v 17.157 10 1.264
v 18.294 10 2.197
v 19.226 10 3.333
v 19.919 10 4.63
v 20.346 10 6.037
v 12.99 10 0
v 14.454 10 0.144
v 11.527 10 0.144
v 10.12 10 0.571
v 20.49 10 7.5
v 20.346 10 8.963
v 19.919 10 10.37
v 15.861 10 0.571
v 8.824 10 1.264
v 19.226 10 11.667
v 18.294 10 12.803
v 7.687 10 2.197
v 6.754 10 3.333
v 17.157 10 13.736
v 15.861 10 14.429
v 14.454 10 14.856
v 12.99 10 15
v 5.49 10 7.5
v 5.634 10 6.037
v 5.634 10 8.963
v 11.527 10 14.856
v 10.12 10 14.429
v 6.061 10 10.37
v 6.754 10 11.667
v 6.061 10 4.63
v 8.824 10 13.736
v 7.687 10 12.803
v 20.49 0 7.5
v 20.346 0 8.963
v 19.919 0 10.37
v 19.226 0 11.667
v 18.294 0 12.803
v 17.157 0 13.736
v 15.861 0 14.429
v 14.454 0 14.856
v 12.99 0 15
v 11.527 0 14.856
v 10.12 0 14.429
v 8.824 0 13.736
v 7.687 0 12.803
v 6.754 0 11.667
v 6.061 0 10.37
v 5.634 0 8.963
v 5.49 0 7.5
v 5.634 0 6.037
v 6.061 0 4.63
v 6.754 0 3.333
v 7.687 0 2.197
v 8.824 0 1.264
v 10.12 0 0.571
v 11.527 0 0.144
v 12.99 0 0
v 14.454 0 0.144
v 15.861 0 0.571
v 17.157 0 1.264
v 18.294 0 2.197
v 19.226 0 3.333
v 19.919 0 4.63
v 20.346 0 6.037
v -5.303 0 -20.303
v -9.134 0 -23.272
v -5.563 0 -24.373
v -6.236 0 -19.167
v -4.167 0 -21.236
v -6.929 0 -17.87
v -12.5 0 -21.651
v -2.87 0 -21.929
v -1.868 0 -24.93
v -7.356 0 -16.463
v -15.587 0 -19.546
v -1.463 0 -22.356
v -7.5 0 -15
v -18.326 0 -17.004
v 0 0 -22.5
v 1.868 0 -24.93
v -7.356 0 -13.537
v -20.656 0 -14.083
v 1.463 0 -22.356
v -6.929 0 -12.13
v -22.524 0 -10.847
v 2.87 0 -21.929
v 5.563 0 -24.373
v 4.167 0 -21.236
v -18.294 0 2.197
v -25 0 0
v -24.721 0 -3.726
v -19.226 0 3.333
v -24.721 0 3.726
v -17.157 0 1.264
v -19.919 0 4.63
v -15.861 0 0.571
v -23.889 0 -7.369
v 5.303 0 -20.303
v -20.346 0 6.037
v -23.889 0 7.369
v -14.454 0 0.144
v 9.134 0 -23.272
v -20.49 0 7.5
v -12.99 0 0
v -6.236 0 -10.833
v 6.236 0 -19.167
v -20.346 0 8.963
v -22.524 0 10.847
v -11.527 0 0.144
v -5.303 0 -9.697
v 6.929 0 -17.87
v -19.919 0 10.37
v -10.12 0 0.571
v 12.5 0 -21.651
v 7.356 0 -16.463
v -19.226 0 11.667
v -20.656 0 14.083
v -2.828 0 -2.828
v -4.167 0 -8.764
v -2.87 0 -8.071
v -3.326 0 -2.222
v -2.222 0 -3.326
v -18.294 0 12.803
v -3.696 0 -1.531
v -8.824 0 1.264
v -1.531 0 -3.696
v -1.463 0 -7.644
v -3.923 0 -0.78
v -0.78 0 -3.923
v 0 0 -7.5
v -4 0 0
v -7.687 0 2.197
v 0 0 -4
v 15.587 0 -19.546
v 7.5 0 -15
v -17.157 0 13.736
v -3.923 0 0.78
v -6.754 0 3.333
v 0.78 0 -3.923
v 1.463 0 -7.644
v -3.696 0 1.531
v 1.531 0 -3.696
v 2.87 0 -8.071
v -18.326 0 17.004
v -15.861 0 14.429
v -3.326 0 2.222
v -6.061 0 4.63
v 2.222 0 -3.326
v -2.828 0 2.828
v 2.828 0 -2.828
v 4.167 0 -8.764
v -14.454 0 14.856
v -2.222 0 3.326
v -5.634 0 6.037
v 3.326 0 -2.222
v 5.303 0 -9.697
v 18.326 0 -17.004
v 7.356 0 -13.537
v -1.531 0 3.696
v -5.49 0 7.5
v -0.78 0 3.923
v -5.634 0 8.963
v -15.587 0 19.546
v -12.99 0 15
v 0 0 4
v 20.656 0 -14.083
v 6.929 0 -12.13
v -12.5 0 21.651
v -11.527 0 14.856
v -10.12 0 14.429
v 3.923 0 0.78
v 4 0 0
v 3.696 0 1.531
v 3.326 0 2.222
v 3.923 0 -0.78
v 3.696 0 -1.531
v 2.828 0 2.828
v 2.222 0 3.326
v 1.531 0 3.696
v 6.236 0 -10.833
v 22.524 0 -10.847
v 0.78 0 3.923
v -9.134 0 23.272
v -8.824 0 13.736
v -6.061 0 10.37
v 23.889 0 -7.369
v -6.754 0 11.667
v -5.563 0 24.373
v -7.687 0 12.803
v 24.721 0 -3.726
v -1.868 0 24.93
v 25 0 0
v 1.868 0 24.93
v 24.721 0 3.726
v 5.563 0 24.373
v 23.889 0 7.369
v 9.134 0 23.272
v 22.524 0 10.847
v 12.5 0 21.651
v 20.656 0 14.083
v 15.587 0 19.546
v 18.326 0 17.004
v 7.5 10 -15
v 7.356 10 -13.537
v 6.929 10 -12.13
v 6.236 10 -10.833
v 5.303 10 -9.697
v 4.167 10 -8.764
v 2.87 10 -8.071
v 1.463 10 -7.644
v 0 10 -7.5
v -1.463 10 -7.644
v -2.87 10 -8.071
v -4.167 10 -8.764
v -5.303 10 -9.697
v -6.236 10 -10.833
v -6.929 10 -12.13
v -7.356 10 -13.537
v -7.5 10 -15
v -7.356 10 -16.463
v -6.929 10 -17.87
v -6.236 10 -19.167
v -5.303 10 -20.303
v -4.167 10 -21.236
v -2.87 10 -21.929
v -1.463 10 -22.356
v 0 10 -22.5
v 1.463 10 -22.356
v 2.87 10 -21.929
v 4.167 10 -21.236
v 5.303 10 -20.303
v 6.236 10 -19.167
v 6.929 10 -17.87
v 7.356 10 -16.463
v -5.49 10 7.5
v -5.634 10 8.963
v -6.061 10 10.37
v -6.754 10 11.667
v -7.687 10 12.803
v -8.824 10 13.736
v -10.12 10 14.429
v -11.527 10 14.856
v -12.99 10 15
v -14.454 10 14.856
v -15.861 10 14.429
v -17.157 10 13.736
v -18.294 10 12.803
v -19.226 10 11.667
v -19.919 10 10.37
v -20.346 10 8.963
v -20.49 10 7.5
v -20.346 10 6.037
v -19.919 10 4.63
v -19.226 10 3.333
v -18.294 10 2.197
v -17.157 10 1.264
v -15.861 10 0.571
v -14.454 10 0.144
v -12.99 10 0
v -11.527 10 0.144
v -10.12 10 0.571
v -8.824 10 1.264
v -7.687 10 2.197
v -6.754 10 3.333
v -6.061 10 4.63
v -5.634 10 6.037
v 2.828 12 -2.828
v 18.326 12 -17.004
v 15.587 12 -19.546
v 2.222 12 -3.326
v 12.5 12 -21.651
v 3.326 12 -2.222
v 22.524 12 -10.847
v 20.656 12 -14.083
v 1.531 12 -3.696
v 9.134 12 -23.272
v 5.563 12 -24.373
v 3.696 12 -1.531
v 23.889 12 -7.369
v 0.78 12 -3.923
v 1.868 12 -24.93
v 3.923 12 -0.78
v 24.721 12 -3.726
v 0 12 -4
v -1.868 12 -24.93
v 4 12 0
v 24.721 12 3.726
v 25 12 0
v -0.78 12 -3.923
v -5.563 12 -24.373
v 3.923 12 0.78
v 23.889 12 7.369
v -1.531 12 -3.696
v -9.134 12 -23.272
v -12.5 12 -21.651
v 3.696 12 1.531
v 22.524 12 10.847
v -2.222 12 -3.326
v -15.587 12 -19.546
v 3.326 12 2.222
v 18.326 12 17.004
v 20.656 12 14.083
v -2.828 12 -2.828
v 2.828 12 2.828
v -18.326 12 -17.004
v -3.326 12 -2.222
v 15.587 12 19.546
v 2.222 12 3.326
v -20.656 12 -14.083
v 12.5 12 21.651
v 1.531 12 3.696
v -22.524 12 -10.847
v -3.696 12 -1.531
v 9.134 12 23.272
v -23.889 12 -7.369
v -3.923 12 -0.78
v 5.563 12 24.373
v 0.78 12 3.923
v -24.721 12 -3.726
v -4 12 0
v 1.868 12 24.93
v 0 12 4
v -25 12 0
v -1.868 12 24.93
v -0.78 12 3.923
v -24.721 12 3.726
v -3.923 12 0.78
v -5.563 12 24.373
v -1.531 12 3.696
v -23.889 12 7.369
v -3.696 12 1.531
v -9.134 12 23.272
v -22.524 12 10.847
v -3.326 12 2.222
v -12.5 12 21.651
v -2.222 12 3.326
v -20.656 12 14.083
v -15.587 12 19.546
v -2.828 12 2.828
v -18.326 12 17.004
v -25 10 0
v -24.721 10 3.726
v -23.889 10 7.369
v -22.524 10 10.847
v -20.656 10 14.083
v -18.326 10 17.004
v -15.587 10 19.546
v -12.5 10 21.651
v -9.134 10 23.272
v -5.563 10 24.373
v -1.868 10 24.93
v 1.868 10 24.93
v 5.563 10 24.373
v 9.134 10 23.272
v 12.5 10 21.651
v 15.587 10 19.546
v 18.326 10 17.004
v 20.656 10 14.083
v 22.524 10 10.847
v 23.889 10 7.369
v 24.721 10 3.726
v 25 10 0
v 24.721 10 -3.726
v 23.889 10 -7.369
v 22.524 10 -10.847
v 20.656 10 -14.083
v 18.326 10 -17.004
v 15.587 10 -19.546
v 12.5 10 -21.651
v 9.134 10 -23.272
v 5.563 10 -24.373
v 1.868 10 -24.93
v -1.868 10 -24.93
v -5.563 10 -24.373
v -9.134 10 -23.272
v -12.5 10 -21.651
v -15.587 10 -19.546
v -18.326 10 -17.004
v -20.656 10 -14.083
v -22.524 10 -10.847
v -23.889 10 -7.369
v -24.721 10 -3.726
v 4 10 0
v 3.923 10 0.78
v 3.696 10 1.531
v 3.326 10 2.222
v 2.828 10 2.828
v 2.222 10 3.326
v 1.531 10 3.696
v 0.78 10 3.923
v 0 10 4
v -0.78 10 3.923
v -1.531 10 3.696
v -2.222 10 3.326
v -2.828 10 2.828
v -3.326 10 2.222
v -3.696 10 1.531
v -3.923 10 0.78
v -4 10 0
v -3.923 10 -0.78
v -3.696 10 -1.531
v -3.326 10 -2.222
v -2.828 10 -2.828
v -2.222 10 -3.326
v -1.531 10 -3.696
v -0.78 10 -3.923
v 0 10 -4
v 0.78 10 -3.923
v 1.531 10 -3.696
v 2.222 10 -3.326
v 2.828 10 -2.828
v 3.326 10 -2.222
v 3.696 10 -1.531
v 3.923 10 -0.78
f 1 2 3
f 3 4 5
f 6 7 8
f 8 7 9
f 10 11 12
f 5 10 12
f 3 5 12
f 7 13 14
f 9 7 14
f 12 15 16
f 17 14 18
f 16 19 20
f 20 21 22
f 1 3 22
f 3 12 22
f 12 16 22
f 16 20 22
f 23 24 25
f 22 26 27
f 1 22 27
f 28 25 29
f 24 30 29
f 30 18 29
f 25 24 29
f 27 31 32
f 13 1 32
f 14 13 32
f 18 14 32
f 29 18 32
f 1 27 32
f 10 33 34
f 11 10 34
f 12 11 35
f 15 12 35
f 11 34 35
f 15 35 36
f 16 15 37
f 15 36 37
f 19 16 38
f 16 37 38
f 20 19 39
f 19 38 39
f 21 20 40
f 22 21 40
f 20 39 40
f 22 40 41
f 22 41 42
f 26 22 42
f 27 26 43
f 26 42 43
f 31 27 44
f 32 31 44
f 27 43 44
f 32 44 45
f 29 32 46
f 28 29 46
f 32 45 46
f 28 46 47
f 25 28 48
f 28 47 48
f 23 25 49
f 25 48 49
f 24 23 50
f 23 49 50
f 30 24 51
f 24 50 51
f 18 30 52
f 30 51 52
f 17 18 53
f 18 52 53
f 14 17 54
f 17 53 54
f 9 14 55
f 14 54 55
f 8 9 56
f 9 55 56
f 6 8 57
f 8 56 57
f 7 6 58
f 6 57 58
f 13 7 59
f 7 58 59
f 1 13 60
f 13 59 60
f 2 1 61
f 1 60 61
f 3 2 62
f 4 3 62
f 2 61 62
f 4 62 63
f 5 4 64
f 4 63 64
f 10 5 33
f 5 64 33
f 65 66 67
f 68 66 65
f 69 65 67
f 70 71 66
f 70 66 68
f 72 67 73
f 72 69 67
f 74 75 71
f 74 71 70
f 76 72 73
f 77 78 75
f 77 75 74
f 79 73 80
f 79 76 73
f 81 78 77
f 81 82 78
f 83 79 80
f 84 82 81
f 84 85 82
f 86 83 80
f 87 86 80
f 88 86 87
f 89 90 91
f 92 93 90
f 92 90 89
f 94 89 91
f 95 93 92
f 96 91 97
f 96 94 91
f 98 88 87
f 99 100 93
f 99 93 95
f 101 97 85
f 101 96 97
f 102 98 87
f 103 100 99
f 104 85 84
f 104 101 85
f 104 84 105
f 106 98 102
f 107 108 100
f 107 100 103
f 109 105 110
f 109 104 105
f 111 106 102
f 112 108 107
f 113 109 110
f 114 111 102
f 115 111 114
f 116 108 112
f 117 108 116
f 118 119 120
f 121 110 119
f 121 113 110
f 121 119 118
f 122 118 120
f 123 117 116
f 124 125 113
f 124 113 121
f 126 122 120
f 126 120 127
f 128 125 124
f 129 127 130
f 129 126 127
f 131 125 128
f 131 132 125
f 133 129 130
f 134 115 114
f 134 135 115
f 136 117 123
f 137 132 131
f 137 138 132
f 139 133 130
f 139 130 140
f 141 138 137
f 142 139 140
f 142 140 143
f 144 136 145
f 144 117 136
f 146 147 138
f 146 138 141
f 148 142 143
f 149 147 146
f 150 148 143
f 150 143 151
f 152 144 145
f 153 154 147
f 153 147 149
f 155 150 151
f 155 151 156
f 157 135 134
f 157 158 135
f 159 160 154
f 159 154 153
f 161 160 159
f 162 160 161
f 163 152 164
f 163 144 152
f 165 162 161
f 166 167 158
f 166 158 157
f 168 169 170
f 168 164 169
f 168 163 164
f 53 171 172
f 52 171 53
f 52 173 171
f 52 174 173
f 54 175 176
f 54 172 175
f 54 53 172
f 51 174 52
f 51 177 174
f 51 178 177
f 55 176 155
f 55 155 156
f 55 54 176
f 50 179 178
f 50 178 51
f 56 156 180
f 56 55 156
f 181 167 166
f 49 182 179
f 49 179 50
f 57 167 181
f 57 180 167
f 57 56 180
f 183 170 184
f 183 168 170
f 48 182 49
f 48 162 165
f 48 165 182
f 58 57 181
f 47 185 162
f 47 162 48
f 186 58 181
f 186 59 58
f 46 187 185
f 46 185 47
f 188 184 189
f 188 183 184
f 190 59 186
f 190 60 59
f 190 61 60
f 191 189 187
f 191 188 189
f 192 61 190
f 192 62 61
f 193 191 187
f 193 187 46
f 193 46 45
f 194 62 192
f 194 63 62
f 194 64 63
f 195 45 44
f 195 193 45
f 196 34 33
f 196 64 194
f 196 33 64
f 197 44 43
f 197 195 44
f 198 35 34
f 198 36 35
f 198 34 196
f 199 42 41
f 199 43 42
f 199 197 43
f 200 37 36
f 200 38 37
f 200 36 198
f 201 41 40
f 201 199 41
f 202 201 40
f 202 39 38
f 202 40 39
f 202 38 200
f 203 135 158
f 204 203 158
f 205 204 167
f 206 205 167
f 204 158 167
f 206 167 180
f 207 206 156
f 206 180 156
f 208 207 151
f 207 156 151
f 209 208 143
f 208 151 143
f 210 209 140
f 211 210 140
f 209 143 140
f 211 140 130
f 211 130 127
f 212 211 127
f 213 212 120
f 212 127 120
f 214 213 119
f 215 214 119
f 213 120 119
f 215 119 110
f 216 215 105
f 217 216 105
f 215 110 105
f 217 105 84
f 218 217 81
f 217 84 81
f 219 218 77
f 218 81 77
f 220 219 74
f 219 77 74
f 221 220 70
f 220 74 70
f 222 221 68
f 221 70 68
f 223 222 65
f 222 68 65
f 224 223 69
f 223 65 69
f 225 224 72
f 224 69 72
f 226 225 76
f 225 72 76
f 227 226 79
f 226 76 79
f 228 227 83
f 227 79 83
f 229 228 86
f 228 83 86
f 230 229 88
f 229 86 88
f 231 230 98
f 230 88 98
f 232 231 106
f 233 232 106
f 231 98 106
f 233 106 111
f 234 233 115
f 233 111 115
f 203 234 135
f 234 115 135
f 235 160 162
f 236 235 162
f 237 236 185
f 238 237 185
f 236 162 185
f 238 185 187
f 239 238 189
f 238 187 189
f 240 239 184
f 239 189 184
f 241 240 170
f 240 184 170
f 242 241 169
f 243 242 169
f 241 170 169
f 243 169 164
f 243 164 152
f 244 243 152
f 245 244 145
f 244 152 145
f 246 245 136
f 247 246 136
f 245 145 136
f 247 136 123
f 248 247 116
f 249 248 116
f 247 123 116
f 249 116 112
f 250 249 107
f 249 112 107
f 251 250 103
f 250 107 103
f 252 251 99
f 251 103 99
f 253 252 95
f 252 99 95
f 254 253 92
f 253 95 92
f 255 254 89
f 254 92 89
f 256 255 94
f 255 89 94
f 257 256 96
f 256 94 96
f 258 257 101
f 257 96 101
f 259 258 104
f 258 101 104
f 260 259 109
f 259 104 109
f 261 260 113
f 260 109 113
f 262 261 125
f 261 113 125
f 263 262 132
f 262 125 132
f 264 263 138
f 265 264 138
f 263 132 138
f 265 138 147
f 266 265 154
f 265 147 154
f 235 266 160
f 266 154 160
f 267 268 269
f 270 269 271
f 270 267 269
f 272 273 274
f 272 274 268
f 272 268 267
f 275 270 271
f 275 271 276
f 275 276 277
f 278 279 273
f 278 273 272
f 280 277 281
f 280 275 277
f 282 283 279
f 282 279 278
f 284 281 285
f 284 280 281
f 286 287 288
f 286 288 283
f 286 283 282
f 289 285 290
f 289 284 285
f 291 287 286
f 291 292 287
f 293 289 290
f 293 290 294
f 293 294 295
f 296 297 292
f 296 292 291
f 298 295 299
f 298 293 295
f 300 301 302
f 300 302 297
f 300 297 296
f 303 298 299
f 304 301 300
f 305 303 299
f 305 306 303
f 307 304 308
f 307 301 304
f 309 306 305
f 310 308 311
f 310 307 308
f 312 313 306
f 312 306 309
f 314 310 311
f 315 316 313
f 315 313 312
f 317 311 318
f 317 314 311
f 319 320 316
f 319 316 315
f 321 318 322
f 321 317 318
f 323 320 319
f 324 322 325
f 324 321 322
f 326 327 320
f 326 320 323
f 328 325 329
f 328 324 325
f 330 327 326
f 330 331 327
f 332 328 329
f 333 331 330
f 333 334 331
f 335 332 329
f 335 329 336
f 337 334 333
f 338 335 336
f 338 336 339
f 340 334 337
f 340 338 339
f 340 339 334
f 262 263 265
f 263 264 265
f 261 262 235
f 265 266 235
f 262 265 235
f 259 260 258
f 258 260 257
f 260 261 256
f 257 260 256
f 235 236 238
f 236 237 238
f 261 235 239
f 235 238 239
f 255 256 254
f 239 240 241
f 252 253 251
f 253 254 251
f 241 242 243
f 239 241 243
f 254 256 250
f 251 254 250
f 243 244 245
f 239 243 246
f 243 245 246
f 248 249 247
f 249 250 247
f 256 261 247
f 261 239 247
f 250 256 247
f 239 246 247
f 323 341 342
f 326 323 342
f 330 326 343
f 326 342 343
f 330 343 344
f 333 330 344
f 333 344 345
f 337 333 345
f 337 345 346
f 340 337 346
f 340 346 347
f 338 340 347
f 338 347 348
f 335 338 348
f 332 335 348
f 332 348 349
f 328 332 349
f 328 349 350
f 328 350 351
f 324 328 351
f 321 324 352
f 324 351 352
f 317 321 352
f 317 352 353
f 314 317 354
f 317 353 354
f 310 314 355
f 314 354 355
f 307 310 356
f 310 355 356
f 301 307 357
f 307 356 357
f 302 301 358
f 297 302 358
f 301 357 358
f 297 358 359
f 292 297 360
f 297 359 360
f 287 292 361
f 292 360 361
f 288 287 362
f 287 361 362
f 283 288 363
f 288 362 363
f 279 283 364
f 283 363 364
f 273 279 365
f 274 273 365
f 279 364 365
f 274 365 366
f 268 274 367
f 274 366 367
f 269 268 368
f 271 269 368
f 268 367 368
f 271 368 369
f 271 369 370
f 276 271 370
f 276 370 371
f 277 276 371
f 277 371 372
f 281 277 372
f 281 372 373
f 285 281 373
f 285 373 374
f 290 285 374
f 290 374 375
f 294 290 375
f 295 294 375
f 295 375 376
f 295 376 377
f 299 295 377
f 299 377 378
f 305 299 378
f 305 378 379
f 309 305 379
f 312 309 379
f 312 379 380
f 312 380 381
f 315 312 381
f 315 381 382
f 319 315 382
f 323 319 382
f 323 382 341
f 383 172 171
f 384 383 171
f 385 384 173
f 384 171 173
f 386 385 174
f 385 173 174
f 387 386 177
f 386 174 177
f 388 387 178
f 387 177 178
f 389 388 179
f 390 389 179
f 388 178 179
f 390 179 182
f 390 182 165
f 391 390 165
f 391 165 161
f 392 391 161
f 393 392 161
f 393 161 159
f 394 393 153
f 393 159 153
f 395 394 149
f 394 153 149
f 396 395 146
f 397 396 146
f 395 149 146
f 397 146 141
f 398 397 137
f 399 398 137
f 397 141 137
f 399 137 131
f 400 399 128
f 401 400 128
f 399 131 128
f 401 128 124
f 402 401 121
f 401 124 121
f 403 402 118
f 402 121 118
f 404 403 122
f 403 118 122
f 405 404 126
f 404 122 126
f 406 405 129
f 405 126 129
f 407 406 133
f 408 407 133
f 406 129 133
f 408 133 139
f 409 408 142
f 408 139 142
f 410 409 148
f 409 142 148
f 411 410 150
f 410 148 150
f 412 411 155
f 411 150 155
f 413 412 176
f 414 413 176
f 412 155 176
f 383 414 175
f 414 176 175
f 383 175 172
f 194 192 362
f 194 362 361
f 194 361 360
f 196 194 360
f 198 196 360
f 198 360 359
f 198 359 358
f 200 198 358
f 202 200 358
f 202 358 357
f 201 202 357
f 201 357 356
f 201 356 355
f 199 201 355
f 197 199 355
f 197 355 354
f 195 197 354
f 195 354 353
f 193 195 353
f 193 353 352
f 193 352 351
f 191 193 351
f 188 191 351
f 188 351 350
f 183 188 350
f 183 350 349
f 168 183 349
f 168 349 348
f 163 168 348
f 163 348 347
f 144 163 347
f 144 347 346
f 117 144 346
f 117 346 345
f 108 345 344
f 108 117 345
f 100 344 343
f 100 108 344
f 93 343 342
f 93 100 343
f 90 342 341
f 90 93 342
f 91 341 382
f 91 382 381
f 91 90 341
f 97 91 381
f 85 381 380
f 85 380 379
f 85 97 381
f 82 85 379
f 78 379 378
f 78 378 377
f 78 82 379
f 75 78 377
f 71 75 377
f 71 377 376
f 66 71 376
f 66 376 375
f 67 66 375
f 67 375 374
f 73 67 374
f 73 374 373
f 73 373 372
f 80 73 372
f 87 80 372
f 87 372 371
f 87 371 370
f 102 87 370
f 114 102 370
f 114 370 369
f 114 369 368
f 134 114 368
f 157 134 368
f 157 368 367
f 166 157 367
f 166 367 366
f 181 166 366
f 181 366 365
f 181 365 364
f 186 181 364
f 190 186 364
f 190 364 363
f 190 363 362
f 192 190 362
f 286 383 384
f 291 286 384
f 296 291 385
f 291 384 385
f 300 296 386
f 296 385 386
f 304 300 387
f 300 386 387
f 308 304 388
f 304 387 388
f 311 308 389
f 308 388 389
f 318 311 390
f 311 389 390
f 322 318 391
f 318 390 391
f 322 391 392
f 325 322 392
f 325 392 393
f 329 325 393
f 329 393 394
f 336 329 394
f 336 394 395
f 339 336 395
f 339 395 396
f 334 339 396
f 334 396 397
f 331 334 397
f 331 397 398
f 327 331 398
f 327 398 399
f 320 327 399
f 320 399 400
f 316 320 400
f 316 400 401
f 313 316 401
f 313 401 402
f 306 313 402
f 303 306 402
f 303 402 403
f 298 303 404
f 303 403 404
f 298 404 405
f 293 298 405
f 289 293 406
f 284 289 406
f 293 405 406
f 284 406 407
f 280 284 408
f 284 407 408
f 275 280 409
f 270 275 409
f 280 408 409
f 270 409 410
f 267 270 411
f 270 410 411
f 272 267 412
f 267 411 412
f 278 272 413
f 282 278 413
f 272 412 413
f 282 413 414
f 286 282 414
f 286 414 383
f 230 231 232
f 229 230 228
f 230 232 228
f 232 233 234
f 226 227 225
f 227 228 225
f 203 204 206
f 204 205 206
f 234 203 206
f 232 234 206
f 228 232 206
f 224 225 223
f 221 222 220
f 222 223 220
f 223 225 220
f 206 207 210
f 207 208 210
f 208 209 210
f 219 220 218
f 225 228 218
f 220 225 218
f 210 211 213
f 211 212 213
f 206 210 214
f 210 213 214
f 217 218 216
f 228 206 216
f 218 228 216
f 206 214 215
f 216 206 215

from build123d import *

# Parameters (mm, degrees)
F0_R     = 25
F0_R_2   = 7.5
F0_R_3   = 4
F1_DEPTH = 10
F2_R     = 25
F3_DEPTH = 2
F4_DEPTH = 25


with BuildPart() as f1:
    # F0 (on Front) → F1 (new body)
    with BuildSketch(Plane.XZ):
        Circle(F0_R)
        with Locations((0, -15)):
            Circle(F0_R_2, mode=Mode.SUBTRACT)
        with Locations((-12.990381, 7.5)):
            Circle(F0_R_2, mode=Mode.SUBTRACT)
        Circle(F0_R_3, mode=Mode.SUBTRACT)
        with Locations((12.990381, 7.5)):
            Circle(F0_R_2, mode=Mode.SUBTRACT)
    extrude(amount=-F1_DEPTH)

    # F2 (on face) → F3 (join)
    with BuildSketch(Plane(origin=(0, 10, 0), x_dir=(-1, 0, 0), z_dir=(0, 1, 0))):
        Circle(F2_R)
    extrude(amount=F3_DEPTH)

    # F0 (on Front) → F4 (cut)
    with BuildSketch(Plane.XZ):
        Circle(F0_R_3)
    extrude(amount=-F4_DEPTH, mode=Mode.SUBTRACT)


solid = f1.part
